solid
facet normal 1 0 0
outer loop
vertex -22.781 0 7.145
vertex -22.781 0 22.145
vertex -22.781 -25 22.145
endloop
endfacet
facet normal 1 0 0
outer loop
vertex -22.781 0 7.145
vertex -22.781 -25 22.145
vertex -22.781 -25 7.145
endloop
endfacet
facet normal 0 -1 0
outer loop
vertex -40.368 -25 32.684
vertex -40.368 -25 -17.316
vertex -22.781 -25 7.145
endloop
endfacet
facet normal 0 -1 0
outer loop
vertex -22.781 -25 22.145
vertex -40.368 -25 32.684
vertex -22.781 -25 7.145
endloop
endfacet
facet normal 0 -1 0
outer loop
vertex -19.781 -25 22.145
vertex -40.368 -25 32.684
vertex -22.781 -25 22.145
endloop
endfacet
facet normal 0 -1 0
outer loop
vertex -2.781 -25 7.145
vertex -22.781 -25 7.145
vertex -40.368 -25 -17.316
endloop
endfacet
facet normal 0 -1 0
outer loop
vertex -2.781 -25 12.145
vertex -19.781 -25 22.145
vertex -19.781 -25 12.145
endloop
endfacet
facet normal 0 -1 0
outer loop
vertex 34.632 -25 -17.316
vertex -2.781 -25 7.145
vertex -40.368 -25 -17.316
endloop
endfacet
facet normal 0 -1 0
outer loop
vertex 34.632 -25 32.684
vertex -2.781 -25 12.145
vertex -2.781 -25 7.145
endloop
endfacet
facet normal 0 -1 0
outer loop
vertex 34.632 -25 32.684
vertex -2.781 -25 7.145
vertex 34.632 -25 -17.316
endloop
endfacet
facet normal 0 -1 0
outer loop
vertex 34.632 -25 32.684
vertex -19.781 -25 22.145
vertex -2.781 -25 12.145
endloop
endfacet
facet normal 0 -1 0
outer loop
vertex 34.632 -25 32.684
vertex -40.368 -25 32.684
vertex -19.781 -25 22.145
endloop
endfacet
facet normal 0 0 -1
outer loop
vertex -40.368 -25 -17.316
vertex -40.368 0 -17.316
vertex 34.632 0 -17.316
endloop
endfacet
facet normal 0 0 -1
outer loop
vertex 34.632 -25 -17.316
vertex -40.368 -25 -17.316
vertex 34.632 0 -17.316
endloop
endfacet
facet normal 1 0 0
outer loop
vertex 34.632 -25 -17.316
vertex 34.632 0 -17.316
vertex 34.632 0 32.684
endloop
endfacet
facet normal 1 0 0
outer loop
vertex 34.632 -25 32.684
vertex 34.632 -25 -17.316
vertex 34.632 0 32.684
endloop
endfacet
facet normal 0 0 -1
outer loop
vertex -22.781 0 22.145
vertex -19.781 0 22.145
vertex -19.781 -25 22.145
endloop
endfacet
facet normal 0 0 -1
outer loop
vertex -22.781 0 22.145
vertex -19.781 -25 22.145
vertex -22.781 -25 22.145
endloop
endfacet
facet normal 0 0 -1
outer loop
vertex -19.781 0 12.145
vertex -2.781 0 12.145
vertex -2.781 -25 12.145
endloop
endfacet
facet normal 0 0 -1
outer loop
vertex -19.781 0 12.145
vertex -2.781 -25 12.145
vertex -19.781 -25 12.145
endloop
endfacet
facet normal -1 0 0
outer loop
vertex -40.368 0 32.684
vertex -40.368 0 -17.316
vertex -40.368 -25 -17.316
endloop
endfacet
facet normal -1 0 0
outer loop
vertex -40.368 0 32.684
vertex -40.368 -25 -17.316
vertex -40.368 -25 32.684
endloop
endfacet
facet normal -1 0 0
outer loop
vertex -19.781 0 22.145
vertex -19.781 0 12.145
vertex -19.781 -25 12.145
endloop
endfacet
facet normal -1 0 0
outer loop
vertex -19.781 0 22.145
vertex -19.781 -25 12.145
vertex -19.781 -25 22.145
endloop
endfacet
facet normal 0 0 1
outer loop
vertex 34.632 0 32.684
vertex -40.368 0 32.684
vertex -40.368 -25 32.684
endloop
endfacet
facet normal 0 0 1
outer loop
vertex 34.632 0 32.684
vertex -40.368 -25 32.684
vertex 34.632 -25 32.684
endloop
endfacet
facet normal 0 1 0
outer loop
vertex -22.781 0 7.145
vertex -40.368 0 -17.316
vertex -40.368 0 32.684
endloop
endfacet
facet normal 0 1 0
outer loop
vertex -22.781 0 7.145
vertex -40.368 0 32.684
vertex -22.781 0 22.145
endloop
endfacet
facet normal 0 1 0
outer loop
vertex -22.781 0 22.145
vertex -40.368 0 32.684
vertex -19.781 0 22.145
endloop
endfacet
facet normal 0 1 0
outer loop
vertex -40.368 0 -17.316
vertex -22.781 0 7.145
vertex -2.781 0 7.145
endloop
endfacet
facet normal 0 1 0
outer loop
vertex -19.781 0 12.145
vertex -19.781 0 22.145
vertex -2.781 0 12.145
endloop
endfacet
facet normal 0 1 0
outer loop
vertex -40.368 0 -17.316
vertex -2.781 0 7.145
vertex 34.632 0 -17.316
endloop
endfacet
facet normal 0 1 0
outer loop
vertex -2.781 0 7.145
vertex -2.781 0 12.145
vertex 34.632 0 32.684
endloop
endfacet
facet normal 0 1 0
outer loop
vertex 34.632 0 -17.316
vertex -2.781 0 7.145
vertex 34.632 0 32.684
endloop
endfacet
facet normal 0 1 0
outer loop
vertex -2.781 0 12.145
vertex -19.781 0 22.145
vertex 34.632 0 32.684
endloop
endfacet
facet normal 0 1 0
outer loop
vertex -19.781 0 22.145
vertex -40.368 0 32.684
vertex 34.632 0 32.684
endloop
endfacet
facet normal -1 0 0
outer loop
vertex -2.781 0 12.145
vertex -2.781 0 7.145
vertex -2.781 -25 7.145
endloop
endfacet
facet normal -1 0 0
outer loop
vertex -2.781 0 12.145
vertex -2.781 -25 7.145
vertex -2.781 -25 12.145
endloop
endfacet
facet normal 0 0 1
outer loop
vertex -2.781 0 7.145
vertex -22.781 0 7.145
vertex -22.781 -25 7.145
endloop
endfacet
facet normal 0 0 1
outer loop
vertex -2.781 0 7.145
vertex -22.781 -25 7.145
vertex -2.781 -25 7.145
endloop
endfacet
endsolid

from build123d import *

# Parameters (mm, degrees)
F0_W     = 75
F0_H     = 50
F1_DEPTH = 25
F3_DEPTH = 25


with BuildPart() as f1:
    # F0 (on Front) → F1 (new body)
    with BuildSketch(Plane.XZ):
        with Locations((-2.86842, 7.68421)):
            Rectangle(F0_W, F0_H)
    extrude(amount=F1_DEPTH)

    # F2 (on Front) → F3 (cut)
    with BuildSketch(Plane.XZ):
        Polygon((-19.781306, 22.144739), (-22.781306, 22.144739), (-22.781306, 7.144739), (-2.781306, 7.144739), (-2.781306, 12.144739), (-19.781306, 12.144739), align=None)
    extrude(amount=F3_DEPTH, mode=Mode.SUBTRACT)


solid = f1.part
